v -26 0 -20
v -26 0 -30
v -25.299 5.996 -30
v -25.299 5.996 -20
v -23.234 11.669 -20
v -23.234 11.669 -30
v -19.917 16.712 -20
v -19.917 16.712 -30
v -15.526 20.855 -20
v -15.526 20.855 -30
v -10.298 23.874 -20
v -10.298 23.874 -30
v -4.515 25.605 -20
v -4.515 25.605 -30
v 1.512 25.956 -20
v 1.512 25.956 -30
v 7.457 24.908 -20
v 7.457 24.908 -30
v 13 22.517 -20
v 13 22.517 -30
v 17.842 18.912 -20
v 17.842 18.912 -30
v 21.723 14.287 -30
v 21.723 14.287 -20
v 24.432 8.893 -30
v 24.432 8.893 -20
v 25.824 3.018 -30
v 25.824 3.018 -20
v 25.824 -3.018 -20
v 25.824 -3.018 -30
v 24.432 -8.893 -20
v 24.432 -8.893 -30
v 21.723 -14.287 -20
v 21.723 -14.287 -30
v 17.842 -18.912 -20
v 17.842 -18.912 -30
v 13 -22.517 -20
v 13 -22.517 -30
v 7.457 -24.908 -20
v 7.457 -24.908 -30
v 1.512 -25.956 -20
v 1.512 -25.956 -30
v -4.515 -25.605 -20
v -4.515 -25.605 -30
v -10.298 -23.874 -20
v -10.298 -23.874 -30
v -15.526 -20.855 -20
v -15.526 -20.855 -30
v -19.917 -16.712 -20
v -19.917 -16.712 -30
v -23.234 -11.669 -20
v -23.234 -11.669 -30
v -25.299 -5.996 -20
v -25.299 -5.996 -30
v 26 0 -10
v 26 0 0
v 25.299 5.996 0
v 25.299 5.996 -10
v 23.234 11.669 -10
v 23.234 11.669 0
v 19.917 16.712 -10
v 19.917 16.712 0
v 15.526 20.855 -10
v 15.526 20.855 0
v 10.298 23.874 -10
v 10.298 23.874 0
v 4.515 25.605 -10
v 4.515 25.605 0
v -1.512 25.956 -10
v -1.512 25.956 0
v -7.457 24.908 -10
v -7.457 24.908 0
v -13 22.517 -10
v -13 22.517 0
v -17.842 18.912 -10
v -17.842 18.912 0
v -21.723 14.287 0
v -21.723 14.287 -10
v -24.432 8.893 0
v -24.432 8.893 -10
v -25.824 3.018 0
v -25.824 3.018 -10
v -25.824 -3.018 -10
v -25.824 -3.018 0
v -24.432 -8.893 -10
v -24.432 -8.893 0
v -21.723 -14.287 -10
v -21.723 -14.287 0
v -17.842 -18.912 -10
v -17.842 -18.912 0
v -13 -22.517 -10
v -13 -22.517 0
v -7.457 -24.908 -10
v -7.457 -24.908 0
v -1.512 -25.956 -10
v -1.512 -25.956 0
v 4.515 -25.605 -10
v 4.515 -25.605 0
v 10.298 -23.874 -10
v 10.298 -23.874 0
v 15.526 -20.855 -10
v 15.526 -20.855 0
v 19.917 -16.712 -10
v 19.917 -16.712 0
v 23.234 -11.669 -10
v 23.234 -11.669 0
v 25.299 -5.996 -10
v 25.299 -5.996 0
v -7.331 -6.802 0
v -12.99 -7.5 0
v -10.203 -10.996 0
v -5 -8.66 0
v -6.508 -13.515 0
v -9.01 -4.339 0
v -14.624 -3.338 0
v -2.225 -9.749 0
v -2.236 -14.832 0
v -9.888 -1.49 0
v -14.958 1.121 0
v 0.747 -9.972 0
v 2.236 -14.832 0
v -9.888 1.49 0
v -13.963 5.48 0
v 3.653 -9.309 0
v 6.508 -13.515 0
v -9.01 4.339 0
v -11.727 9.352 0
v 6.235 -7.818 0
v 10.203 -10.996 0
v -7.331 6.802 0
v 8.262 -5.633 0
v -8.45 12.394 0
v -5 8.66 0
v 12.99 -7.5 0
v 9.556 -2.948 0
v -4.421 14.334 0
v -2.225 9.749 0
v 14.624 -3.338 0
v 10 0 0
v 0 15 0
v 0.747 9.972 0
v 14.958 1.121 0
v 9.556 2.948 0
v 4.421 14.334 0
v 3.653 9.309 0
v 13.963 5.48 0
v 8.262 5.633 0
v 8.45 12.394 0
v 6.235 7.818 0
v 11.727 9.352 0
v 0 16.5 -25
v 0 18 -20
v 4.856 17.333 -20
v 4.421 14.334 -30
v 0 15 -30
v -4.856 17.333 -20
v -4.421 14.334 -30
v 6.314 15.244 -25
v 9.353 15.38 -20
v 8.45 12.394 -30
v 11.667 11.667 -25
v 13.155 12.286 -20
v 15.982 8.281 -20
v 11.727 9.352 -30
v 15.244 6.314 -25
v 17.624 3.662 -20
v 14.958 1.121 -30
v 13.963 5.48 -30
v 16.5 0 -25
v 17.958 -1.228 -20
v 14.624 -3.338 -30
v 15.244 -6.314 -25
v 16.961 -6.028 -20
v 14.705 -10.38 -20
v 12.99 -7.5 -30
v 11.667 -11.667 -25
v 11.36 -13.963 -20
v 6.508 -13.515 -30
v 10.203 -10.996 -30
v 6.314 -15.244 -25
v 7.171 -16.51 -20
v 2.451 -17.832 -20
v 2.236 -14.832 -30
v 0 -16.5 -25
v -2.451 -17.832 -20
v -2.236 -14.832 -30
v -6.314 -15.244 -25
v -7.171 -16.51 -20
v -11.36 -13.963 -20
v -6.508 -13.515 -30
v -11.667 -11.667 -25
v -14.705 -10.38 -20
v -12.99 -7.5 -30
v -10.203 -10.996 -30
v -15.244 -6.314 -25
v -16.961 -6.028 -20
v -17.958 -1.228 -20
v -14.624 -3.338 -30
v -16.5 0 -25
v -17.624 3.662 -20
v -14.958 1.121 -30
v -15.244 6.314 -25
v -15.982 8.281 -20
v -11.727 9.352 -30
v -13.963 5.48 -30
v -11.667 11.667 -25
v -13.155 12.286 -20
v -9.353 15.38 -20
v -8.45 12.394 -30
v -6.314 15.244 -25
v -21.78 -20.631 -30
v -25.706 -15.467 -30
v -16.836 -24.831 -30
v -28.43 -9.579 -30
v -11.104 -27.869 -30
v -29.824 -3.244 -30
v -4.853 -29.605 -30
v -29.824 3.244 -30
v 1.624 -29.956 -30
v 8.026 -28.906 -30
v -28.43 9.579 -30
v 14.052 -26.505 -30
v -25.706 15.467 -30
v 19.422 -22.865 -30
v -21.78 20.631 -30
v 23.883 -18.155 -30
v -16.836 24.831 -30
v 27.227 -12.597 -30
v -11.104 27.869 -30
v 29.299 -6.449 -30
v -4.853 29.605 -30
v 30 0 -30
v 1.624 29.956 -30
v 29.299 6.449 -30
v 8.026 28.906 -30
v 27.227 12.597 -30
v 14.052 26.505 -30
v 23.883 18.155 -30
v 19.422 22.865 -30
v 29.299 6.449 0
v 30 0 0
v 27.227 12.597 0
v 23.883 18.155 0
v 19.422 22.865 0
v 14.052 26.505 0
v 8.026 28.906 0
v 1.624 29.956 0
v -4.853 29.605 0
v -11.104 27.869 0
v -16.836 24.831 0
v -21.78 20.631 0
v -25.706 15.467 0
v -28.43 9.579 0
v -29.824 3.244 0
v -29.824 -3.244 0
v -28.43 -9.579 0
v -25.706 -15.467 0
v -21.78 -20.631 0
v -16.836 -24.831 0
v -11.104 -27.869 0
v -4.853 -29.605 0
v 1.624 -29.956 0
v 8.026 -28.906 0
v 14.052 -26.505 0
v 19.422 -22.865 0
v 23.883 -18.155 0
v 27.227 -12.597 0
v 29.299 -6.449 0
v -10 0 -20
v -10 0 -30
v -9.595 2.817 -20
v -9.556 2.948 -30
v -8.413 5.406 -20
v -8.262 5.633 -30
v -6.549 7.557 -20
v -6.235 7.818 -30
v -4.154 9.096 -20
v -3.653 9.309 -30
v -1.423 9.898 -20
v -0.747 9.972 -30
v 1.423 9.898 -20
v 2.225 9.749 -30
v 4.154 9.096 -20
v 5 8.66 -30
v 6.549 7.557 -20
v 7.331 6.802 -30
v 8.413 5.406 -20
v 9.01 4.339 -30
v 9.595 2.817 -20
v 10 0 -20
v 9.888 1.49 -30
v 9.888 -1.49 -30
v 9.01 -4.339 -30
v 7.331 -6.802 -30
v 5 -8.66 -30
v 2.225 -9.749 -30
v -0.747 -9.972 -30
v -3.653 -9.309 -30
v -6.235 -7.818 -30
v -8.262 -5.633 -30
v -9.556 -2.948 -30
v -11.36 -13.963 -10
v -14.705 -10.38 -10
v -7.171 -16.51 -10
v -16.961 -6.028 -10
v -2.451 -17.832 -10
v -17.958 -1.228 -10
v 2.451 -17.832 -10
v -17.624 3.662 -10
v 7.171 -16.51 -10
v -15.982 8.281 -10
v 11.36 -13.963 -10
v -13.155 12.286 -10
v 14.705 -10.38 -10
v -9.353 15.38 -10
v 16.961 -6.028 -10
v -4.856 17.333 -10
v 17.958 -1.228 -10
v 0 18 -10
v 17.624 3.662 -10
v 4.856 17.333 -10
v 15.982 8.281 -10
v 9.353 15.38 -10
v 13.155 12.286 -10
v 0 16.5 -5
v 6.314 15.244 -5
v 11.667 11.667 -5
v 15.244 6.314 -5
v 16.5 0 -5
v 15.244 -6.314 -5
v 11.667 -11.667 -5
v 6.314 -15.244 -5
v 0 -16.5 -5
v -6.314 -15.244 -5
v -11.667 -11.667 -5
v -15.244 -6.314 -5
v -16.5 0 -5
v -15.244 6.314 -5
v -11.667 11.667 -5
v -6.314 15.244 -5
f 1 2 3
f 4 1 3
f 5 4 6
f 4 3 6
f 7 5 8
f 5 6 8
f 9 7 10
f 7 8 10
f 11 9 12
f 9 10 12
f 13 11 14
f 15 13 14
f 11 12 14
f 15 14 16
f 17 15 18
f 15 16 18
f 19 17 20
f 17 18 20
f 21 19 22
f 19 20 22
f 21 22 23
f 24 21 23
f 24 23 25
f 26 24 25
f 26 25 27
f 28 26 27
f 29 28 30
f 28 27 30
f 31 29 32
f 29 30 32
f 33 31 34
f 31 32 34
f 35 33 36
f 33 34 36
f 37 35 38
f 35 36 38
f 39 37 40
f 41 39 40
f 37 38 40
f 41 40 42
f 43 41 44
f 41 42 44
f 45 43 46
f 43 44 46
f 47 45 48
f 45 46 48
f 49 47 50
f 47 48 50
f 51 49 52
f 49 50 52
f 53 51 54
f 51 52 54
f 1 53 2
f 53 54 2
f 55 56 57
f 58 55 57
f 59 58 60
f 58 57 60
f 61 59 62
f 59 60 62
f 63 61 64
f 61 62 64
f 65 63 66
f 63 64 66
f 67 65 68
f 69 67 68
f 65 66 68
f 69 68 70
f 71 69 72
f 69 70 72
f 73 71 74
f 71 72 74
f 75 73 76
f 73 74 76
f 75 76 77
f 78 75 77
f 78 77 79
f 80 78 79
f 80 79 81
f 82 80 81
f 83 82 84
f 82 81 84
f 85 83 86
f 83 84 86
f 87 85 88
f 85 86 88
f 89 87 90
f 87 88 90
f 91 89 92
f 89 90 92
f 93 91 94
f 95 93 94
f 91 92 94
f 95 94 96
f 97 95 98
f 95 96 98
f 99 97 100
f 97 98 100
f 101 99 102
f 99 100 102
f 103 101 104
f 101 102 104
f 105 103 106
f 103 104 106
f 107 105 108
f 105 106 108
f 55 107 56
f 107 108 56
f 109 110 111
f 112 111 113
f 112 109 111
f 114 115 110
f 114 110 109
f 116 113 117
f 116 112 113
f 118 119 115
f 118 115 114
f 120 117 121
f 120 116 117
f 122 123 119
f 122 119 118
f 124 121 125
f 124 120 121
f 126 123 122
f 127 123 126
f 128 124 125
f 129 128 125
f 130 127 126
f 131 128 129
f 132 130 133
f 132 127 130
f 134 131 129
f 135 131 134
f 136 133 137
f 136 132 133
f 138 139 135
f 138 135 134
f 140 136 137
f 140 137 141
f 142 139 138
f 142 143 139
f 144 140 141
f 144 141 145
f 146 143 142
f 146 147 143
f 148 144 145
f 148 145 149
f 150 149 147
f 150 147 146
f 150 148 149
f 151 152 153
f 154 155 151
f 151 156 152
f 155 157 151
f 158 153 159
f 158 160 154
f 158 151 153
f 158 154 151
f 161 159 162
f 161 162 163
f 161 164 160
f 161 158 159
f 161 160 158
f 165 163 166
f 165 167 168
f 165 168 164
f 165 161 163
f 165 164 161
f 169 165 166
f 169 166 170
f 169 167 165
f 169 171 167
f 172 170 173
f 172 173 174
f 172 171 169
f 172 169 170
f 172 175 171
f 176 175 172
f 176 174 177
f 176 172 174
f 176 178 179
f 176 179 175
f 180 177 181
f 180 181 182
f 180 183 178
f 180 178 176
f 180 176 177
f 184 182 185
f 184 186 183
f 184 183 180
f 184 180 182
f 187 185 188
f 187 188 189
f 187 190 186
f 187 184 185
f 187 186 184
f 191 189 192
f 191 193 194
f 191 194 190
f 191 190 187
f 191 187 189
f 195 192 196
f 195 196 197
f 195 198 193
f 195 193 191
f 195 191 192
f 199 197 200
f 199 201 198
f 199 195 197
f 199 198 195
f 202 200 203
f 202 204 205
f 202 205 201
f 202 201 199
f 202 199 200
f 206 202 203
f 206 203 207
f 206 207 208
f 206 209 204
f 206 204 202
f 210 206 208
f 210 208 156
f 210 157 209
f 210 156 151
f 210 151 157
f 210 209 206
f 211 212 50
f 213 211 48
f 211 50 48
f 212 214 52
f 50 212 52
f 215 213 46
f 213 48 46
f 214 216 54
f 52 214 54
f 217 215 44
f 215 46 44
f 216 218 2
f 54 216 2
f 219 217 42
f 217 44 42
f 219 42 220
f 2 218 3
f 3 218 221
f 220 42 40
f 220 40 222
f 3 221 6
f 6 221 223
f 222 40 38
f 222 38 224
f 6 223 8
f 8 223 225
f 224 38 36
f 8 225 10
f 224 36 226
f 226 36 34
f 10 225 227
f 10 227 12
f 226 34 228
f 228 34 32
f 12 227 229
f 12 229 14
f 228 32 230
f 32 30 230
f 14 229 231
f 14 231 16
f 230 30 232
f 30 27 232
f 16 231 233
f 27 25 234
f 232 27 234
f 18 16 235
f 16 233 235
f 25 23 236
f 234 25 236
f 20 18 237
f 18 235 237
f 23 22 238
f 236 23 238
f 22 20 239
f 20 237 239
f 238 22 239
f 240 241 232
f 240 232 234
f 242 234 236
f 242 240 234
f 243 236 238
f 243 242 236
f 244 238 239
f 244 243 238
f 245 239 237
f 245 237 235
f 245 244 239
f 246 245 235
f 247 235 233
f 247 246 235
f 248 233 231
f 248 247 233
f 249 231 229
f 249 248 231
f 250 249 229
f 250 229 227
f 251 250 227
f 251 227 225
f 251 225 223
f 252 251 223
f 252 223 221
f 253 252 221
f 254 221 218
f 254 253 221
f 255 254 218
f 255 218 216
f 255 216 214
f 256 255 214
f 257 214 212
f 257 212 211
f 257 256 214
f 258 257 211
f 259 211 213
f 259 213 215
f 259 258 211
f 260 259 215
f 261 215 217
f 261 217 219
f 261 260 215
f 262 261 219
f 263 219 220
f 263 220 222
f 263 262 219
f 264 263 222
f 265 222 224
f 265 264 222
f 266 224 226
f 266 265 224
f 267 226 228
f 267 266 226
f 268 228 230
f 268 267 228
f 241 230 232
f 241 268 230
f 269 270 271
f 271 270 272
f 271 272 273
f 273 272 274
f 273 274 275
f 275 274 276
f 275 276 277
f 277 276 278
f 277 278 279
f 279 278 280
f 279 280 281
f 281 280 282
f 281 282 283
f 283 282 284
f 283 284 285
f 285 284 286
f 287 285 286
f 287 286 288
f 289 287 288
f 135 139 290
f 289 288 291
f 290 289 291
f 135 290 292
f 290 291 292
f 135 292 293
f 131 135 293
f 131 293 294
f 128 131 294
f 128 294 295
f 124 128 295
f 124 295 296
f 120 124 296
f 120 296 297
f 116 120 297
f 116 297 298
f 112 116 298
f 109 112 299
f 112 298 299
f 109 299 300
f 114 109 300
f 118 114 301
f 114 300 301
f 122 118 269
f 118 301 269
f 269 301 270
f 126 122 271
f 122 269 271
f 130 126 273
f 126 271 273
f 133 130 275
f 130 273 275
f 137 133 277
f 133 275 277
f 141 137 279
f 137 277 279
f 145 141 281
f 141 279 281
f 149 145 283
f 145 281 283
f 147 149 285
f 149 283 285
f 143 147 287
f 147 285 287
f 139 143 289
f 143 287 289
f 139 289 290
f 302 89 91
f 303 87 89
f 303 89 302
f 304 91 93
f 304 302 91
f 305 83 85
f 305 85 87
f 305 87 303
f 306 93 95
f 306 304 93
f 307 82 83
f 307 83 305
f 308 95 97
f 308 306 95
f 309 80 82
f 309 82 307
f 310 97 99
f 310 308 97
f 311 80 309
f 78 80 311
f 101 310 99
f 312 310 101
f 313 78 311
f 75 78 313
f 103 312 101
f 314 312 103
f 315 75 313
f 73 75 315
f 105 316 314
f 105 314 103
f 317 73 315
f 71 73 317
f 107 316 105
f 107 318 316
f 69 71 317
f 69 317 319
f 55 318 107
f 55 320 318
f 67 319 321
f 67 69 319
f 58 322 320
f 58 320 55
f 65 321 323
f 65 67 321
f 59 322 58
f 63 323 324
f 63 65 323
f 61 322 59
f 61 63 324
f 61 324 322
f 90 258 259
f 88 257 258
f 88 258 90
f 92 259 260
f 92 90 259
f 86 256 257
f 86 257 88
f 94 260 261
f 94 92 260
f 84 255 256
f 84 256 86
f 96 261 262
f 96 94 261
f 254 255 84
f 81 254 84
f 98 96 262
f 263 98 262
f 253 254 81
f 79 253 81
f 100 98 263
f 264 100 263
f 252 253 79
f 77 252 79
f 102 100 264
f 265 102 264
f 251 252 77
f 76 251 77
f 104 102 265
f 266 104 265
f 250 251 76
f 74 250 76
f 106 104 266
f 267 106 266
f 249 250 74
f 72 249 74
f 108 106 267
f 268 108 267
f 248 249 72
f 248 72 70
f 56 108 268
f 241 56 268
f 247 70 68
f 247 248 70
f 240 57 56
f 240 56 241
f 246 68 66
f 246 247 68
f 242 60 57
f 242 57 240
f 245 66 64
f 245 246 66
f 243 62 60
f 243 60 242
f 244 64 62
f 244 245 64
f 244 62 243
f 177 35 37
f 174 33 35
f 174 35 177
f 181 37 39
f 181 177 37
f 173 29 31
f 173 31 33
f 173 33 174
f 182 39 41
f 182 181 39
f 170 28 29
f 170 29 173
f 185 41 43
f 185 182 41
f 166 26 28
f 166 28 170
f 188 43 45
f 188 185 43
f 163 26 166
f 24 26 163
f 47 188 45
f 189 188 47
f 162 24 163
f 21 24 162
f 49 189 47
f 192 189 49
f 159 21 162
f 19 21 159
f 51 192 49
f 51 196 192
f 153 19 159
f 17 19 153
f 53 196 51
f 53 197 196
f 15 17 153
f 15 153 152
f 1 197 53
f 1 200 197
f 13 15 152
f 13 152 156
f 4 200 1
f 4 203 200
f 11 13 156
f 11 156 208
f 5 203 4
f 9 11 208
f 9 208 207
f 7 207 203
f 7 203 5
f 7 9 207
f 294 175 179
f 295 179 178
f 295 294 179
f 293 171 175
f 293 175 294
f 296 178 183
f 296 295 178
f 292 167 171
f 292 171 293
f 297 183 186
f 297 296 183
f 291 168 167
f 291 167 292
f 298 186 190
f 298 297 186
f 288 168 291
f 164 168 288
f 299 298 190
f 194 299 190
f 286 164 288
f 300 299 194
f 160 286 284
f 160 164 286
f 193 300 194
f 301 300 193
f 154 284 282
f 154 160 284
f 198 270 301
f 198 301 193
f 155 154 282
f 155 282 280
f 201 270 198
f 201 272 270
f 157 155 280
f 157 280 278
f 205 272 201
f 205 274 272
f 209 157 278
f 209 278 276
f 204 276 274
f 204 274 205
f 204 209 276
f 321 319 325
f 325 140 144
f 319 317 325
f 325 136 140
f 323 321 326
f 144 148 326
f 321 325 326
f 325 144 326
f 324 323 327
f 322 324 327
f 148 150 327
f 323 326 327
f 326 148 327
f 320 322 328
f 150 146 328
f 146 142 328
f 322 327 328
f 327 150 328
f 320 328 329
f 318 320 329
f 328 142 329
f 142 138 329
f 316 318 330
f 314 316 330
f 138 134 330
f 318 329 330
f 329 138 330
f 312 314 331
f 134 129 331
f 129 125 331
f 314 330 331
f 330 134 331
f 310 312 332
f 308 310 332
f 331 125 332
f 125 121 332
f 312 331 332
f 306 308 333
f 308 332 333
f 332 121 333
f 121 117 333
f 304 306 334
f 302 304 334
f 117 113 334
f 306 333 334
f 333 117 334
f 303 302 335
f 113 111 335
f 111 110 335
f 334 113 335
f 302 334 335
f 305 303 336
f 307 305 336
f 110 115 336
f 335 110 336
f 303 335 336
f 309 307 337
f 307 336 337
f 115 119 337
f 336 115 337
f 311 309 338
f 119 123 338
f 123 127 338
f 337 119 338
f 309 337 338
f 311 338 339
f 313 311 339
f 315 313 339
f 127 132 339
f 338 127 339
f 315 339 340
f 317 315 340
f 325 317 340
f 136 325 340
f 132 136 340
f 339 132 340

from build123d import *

# Parameters (mm, degrees)
IZIM1_R                     = 30
Y_KSEKLIK_EKSTR_ZYON1_DEPTH = 30
IZIM2_R                     = 26
KES_EKSTR_ZYON1_DEPTH       = 10
IZIM3_R                     = 26
KES_EKSTR_ZYON2_DEPTH       = 10
IZIM4_R                     = 10
KES_EKSTR_ZYON3_DEPTH       = 10
IZIM6_R                     = 15
Y_KSEKLIK_EKSTR_ZYON3_DEPTH = 10
IZIM7_R                     = 10
KES_EKSTR_ZYON4_DEPTH       = 10
IZIM8_R                     = 15
Y_KSEKLIK_EKSTR_ZYON4_DEPTH = 10
IZIM9_R                     = 10
KES_EKSTR_ZYON5_DEPTH       = 10


with BuildPart() as part:
    # Çizim1 → Yükseklik-Ekstrüzyon1 (new body)
    with BuildSketch(Plane.XY):
        Circle(IZIM1_R)
    extrude(amount=-Y_KSEKLIK_EKSTR_ZYON1_DEPTH)

    # Çizim2 → Kes-Ekstrüzyon1 (cut)
    with BuildSketch(Plane.XY):
        Circle(IZIM2_R)
    extrude(amount=-KES_EKSTR_ZYON1_DEPTH, mode=Mode.SUBTRACT)

    # Çizim3 → Kes-Ekstrüzyon2 (cut)
    with BuildSketch(Plane(origin=(0, 0, -30), x_dir=(-1, 0, 0), z_dir=(0, 0, -1))):
        Circle(IZIM3_R)
    extrude(amount=-KES_EKSTR_ZYON2_DEPTH, mode=Mode.SUBTRACT)

    # Çizim4 → Kes-Ekstrüzyon3 (cut)
    with BuildSketch(Plane.XY.offset(-10)):
        Circle(IZIM4_R)
    extrude(amount=-KES_EKSTR_ZYON3_DEPTH, mode=Mode.SUBTRACT)

    # Çizim6 → Yükseklik-Ekstrüzyon3 (add)
    with BuildSketch(Plane.XY.offset(-10)):
        Circle(IZIM6_R)
    extrude(amount=Y_KSEKLIK_EKSTR_ZYON3_DEPTH)

    # Çizim7 → Kes-Ekstrüzyon4 (cut)
    with BuildSketch(Plane.XY):
        Circle(IZIM7_R)
    extrude(amount=-KES_EKSTR_ZYON4_DEPTH, mode=Mode.SUBTRACT)

    # Çizim8 → Yükseklik-Ekstrüzyon4 (add)
    with BuildSketch(Plane(origin=(0, 0, -20), x_dir=(-1, 0, 0), z_dir=(0, 0, -1))):
        Circle(IZIM8_R)
    extrude(amount=Y_KSEKLIK_EKSTR_ZYON4_DEPTH)

    # Çizim9 → Kes-Ekstrüzyon5 (cut)
    with BuildSketch(Plane(origin=(0, 0, -30), x_dir=(-1, 0, 0), z_dir=(0, 0, -1))):
        Circle(IZIM9_R)
    extrude(amount=-KES_EKSTR_ZYON5_DEPTH, mode=Mode.SUBTRACT)

    # Çizim12 → Döndür1 (revolve)
    with BuildSketch(Plane(origin=(0, 0, 0), x_dir=(0, 0, -1), z_dir=(1, 0, 0))):
        Polygon((10, 18), (0, 15), (10, 15), align=None)
    d_nd_r1 = revolve(axis=Axis((0, 0, 0), (0, 0, -1)))

    # Aynalama1: Döndür1 across plane
    add(d_nd_r1.mirror(Plane.XY.offset(-15)))


solid = part.part
